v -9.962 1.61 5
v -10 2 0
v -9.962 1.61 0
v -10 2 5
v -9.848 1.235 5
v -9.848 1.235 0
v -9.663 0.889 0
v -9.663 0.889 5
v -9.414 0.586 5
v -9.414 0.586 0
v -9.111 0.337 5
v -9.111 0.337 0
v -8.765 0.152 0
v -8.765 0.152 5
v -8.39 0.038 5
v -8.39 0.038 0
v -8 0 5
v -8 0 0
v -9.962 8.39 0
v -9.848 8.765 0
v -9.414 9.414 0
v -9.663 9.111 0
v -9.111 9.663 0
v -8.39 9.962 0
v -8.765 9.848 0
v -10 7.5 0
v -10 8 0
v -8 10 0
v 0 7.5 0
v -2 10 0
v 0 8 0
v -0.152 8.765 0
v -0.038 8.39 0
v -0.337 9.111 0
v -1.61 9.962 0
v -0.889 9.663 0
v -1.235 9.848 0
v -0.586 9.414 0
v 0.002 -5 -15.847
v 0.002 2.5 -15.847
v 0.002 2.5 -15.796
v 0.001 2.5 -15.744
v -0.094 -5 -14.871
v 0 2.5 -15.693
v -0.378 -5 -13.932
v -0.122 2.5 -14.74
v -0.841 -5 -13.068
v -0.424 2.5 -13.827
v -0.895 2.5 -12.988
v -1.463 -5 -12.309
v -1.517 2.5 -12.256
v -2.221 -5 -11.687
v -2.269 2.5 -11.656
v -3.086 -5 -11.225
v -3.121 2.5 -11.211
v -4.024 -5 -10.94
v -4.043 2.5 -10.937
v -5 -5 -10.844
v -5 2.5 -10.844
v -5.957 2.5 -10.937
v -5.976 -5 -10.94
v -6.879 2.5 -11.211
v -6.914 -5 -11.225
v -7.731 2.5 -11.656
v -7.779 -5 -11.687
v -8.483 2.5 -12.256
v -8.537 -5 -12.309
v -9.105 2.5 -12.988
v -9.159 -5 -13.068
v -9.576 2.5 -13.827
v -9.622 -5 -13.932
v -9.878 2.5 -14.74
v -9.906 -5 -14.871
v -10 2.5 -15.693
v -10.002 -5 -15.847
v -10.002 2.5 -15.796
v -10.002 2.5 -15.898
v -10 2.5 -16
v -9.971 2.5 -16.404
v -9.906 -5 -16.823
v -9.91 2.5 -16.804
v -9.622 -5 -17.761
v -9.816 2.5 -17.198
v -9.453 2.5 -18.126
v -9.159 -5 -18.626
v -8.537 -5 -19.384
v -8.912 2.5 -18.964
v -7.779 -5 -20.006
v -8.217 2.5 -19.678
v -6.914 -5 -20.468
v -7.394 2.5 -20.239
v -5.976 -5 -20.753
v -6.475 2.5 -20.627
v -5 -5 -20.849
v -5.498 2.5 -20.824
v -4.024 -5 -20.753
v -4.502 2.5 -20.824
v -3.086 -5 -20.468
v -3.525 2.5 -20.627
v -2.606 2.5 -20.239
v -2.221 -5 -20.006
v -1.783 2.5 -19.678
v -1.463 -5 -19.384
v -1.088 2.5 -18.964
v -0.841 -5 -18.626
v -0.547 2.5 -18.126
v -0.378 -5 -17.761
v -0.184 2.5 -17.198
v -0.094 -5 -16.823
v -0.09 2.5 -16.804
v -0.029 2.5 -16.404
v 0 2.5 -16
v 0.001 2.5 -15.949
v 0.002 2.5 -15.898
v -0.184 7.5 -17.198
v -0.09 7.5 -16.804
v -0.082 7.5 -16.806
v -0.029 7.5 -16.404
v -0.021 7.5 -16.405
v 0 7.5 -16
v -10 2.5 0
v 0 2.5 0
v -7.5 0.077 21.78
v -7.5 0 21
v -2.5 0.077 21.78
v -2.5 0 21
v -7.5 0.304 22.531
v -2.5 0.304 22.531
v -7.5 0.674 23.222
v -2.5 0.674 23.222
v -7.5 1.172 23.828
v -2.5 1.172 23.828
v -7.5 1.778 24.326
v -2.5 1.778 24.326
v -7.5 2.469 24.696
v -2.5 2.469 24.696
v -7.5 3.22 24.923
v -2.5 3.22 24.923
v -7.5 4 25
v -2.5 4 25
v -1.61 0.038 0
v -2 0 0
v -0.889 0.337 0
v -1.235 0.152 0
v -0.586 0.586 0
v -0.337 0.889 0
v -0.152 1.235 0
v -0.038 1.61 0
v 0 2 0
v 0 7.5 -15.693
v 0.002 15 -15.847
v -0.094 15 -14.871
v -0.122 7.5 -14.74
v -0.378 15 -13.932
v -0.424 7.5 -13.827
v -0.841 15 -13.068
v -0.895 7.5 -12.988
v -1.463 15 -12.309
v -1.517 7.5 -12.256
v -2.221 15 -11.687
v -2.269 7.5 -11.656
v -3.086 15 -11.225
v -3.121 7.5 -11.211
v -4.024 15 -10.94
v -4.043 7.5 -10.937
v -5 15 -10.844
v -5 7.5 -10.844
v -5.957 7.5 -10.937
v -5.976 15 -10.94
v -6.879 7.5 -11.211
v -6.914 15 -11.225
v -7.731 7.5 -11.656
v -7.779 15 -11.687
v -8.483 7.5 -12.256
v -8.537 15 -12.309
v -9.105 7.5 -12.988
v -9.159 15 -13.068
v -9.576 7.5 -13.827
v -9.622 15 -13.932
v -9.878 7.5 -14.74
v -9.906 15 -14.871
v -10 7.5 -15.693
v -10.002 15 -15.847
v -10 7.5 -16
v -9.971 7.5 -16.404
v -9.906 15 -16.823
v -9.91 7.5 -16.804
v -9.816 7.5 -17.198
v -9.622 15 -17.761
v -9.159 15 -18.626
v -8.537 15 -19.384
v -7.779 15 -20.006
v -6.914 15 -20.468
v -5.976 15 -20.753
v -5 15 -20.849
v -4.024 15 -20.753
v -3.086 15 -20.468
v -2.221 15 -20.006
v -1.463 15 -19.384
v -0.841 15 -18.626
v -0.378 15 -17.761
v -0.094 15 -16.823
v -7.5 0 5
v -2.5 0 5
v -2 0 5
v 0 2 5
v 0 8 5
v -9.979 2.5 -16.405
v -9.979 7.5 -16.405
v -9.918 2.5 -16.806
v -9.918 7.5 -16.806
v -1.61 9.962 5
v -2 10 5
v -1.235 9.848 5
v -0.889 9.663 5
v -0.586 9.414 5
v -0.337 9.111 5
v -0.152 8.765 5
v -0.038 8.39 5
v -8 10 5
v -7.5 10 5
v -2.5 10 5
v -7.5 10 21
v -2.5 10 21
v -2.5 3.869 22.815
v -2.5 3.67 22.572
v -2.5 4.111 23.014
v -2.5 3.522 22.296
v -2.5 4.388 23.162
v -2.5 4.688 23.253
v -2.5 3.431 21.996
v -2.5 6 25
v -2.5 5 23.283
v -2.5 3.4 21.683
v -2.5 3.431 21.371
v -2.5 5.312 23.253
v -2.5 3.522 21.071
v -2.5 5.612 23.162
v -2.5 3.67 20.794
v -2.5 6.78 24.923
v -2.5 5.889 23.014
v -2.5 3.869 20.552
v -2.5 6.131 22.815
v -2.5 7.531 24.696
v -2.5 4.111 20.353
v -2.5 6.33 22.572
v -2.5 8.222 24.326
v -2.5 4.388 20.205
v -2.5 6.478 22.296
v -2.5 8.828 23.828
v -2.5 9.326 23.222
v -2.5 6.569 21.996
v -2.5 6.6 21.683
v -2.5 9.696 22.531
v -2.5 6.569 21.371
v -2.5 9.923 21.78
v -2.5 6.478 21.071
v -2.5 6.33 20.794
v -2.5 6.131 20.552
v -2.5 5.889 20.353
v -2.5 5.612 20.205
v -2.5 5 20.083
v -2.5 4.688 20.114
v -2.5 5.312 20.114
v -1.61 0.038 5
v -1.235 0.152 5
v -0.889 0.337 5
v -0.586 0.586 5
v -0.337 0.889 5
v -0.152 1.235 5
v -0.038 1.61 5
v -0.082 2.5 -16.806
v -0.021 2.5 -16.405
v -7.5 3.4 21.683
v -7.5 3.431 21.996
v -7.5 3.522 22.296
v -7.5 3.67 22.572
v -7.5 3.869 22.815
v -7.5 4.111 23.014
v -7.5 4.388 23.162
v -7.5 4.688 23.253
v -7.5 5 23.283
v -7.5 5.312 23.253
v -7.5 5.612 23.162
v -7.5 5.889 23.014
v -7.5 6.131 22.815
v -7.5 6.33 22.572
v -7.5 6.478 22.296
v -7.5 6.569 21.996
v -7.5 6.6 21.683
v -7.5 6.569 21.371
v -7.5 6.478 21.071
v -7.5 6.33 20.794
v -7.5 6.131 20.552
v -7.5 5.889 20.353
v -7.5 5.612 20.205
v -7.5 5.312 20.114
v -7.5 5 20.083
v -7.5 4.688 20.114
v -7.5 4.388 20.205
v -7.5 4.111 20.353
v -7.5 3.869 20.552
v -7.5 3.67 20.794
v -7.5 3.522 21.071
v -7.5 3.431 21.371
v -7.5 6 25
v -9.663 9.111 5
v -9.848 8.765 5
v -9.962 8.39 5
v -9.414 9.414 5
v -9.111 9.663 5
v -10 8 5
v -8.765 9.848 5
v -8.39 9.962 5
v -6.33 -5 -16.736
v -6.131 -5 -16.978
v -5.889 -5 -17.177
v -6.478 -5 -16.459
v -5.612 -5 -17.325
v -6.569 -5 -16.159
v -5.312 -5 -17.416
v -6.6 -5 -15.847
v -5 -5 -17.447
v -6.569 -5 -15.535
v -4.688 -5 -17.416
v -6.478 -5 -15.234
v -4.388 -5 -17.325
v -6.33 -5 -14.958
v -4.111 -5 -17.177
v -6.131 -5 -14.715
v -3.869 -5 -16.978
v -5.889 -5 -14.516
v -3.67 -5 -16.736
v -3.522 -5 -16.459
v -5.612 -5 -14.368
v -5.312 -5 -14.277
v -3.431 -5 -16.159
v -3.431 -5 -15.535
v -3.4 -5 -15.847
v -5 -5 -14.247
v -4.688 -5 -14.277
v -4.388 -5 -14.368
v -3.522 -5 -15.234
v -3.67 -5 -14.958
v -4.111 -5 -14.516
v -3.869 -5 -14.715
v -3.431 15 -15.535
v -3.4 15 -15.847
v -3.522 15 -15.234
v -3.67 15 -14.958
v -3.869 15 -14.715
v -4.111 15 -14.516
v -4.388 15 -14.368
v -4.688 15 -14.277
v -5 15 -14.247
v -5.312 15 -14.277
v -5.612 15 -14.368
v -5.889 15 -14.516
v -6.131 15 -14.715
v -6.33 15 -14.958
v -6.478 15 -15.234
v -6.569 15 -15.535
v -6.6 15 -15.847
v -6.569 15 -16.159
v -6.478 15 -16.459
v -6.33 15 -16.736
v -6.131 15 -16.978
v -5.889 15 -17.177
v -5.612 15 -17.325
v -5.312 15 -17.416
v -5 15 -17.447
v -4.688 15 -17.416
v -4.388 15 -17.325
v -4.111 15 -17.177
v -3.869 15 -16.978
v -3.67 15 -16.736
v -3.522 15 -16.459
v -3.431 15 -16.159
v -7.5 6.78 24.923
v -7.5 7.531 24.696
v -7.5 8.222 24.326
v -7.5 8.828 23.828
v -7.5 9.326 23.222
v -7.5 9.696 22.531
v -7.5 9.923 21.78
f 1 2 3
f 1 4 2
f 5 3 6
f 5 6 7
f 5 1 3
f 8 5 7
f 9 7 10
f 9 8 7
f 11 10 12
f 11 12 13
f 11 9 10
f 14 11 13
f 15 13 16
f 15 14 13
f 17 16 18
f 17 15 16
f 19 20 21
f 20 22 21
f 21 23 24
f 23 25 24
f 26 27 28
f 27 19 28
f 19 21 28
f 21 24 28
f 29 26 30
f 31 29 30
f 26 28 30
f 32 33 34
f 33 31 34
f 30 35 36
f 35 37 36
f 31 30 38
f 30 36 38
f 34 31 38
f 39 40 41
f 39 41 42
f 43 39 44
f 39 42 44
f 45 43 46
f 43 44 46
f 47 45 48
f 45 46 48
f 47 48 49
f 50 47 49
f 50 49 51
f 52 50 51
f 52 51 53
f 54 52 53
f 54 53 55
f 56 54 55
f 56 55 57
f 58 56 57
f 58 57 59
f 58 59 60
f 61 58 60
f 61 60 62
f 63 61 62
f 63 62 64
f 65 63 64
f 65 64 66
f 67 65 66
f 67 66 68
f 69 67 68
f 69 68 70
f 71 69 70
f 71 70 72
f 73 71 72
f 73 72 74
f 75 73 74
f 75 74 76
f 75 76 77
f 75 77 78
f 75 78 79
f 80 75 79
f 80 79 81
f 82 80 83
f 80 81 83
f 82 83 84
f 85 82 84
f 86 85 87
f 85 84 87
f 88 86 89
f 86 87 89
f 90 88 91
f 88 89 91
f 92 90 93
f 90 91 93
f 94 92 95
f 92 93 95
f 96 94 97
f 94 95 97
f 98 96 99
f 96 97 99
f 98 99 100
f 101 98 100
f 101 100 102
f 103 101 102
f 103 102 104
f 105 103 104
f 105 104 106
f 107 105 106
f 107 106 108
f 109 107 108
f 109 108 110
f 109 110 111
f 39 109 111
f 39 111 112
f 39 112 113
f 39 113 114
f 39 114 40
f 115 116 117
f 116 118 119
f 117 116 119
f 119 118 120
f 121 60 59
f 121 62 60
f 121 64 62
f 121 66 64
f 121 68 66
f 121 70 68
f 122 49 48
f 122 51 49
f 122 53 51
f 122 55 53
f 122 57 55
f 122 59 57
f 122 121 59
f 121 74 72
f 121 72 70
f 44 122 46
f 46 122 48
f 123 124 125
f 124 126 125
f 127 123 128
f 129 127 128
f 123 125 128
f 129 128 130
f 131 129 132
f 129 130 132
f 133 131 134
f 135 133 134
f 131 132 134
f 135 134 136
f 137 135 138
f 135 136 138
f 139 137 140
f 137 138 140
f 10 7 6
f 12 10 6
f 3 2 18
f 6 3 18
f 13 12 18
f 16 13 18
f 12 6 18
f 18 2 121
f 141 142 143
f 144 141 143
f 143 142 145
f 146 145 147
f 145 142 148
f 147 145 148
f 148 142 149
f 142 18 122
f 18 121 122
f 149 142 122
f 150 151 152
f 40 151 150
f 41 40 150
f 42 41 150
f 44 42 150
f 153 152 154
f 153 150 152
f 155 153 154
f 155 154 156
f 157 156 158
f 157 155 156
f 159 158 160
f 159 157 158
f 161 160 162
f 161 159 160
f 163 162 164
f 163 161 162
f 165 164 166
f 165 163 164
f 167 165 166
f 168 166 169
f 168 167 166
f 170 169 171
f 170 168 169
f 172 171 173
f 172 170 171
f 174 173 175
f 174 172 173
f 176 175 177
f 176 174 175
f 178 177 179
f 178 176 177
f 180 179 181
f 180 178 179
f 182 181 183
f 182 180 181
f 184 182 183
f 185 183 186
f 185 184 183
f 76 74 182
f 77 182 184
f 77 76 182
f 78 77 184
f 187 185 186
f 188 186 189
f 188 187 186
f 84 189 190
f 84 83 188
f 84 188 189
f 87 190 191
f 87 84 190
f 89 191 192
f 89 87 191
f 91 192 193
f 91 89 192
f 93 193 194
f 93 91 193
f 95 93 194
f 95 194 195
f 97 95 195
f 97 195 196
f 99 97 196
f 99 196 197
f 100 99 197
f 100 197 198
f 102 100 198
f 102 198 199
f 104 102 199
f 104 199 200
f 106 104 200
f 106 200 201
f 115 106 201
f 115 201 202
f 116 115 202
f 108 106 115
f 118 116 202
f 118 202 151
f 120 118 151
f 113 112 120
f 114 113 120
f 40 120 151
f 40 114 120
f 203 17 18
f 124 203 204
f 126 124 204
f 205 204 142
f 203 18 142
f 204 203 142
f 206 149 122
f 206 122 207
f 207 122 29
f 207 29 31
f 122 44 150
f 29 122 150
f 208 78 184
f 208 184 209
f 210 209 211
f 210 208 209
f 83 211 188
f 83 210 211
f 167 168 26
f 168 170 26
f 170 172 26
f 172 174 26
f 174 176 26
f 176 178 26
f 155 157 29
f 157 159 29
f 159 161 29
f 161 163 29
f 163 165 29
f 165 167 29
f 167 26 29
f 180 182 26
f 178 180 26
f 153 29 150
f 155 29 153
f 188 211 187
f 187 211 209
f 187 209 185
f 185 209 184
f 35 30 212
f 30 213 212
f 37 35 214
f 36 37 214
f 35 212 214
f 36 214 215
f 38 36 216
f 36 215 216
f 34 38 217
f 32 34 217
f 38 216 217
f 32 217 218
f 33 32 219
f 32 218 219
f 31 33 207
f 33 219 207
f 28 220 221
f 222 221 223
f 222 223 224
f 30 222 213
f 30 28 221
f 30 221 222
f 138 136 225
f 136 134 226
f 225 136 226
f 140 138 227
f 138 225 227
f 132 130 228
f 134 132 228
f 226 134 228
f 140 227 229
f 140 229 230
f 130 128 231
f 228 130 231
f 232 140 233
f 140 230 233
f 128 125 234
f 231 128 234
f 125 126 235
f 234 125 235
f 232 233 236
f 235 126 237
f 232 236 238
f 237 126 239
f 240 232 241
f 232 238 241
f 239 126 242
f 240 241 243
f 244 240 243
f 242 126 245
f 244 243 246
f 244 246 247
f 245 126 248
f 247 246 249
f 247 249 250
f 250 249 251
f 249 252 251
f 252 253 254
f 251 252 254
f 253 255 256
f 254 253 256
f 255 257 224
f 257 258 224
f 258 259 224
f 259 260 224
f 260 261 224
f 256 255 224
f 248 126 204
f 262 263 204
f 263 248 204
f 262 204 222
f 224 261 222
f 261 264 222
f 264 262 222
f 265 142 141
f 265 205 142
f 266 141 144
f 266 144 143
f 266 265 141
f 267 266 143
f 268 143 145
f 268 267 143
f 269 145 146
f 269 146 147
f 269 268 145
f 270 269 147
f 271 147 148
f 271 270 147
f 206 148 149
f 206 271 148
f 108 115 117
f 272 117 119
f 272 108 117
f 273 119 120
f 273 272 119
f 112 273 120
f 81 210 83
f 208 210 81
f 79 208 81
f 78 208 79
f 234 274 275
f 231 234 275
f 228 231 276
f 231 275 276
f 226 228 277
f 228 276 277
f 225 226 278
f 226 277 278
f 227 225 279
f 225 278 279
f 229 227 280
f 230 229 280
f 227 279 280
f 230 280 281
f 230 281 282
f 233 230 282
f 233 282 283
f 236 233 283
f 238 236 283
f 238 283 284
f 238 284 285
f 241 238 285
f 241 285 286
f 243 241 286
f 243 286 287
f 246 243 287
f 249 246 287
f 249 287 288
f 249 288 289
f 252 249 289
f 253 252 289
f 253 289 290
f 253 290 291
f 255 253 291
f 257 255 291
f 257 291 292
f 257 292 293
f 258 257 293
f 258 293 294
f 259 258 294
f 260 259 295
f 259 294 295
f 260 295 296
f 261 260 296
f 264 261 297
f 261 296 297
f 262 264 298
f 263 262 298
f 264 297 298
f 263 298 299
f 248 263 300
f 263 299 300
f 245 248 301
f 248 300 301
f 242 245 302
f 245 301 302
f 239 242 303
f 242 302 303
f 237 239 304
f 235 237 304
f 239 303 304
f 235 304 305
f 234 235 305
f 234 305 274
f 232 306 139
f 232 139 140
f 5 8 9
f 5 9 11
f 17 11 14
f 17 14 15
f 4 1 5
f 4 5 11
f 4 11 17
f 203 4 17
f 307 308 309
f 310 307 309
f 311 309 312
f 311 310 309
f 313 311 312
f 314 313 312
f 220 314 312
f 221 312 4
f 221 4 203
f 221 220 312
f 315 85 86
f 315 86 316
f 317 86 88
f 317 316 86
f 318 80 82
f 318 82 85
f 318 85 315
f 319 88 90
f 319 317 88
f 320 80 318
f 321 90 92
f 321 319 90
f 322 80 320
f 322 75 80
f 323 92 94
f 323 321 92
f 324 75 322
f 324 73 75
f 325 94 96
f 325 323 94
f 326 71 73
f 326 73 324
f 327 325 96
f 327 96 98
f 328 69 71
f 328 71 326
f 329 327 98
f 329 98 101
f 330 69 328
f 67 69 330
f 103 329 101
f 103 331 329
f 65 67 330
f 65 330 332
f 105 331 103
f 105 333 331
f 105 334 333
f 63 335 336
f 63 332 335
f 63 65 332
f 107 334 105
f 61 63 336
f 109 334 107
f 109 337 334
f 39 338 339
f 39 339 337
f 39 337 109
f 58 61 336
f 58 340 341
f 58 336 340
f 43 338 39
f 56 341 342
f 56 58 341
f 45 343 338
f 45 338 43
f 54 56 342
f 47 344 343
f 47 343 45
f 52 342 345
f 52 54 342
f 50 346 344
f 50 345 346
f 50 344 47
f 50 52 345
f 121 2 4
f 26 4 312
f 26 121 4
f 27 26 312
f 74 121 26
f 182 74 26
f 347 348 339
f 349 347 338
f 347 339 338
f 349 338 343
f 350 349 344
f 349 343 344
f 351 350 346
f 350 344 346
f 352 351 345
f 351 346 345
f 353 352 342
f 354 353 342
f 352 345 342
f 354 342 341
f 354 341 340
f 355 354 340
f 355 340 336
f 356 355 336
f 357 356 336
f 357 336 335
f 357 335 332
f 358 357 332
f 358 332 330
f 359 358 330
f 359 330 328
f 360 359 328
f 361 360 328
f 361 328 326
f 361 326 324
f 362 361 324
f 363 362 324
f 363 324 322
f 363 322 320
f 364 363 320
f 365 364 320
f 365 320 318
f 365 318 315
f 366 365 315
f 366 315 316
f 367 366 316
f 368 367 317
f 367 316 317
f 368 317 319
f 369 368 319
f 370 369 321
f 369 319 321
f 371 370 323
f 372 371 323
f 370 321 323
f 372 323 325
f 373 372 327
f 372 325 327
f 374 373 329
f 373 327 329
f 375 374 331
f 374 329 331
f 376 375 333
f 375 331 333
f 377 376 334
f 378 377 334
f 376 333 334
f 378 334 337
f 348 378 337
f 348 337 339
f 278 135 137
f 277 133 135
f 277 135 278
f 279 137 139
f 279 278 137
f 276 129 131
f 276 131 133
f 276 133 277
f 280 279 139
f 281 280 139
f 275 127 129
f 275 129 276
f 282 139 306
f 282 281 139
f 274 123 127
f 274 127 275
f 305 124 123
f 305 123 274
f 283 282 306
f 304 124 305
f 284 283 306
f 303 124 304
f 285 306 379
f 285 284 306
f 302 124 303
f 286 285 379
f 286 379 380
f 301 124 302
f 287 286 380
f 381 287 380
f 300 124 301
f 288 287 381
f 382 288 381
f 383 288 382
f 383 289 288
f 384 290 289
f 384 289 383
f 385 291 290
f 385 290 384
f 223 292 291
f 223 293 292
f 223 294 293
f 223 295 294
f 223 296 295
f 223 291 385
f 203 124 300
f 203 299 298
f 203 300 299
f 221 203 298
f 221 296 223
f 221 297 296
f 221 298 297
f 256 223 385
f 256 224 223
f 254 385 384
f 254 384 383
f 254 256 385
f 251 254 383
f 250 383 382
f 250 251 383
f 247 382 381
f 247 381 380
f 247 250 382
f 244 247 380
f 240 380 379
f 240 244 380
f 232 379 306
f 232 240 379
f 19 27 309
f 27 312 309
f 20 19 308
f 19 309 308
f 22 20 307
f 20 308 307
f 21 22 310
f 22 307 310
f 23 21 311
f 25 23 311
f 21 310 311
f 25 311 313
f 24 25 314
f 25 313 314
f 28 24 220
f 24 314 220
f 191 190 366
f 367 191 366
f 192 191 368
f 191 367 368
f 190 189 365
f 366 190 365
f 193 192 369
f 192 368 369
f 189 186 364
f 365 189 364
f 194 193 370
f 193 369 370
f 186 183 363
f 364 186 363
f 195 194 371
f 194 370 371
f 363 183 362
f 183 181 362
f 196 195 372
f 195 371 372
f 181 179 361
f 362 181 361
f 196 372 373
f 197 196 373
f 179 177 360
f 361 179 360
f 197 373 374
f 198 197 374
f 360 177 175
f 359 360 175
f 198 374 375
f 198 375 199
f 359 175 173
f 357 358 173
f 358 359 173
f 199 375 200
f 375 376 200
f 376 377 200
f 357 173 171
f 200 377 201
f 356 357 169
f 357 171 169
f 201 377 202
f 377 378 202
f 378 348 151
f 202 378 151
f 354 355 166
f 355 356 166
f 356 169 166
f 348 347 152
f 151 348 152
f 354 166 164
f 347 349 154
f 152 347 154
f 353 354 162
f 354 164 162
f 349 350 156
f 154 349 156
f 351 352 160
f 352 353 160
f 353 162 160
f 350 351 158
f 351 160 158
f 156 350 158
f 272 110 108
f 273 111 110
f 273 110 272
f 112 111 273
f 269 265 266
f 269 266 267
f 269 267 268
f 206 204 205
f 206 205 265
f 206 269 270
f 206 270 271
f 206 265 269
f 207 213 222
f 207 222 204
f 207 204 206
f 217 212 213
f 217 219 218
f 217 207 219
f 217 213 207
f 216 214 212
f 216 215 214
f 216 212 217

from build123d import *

# Parameters (mm, degrees)
SKETCH_W          = 10
SKETCH_H          = 10
PAD_DEPTH         = 5
SKETCH001_W       = 5
SKETCH001_H       = 10
PAD001_DEPTH      = 20
SKETCH002_W       = 10
SKETCH002_H       = 5
PAD002_DEPTH      = 20
SKETCH003_R       = 1.6
POCKET_DEPTH      = 5
SKETCH004_R       = 1.6
POCKET001_DEPTH   = 7.501
FILLET_R          = 4
FILLET001_R       = 2
SKETCH006_R       = 5.00235
PAD003_DEPTH      = 7.5
PAD003_DEPTH_BACK = 12.5
SKETCH007_R       = 1.6
POCKET002_DEPTH   = 20.001


with BuildPart() as part:
    # Sketch → Pad (new body)
    with BuildSketch(Plane.XY):
        with Locations((-5, 5)):
            Rectangle(SKETCH_W, SKETCH_H)
    extrude(amount=PAD_DEPTH)

    # Sketch001 (on Face6 of Pad) → Pad001 (join)
    with BuildSketch(Plane.XY.offset(5)):
        with Locations((-5, 5)):
            Rectangle(SKETCH001_W, SKETCH001_H)
    extrude(amount=PAD001_DEPTH)

    # Sketch002 (on Face4 of Pad001) → Pad002 (join)
    with BuildSketch(Plane(origin=(0, 0, 0), x_dir=(1, 0, 0), z_dir=(0, 0, -1))):
        with Locations((-5, -5)):
            Rectangle(SKETCH002_W, SKETCH002_H)
    extrude(amount=PAD002_DEPTH)

    # Sketch003 (on Face17 of Pad002) → Pocket (cut)
    with BuildSketch(Plane(origin=(0, 7.5, 0), x_dir=(-1, 0, 0), z_dir=(0, 1, 0))):
        with Locations((5, -15.846688)):
            Circle(SKETCH003_R)
    extrude(amount=-POCKET_DEPTH, mode=Mode.SUBTRACT)

    # Sketch004 (on Face14 of Pocket) → Pocket001 (cut, through all)
    with BuildSketch(Plane(origin=(-7.5, 0, 0), x_dir=(0, -1, 0), z_dir=(-1, 0, 0))):
        with Locations((-5, 21.683375)):
            Circle(SKETCH004_R)
    extrude(amount=-POCKET001_DEPTH, mode=Mode.SUBTRACT)

    # Fillet
    fillet_edges = [part.edges().sort_by_distance(p)[0] for p in [
        (-10, 5, -20),
        (0, 5, -20),
        (-5, 10, 25),
        (-5, 0, 25),
    ]]
    fillet(fillet_edges, radius=FILLET_R)

    # Fillet001
    fillet001_edges = [part.edges().sort_by_distance(p)[0] for p in [
        (-10, 10, 2.5),
        (-10, 0, 2.5),
        (0, 10, 2.5),
        (0, 0, 2.5),
    ]]
    fillet(fillet001_edges, radius=FILLET001_R)

    # Sketch006 (on Face9 of Fillet001) → Pad003 (join, two sides)
    with BuildSketch(Plane.XZ.offset(-2.5)) as pad003_sk:
        with Locations((-5, -15.846688)):
            Circle(SKETCH006_R)
    extrude(amount=PAD003_DEPTH)
    extrude(pad003_sk.sketch, amount=-PAD003_DEPTH_BACK)

    # Sketch007 (on Face27 of Pad003) → Pocket002 (cut, through all)
    with BuildSketch(Plane.XZ.offset(5)):
        with Locations((-5, -15.846688)):
            Circle(SKETCH007_R)
    extrude(amount=-POCKET002_DEPTH, mode=Mode.SUBTRACT)


solid = part.part
